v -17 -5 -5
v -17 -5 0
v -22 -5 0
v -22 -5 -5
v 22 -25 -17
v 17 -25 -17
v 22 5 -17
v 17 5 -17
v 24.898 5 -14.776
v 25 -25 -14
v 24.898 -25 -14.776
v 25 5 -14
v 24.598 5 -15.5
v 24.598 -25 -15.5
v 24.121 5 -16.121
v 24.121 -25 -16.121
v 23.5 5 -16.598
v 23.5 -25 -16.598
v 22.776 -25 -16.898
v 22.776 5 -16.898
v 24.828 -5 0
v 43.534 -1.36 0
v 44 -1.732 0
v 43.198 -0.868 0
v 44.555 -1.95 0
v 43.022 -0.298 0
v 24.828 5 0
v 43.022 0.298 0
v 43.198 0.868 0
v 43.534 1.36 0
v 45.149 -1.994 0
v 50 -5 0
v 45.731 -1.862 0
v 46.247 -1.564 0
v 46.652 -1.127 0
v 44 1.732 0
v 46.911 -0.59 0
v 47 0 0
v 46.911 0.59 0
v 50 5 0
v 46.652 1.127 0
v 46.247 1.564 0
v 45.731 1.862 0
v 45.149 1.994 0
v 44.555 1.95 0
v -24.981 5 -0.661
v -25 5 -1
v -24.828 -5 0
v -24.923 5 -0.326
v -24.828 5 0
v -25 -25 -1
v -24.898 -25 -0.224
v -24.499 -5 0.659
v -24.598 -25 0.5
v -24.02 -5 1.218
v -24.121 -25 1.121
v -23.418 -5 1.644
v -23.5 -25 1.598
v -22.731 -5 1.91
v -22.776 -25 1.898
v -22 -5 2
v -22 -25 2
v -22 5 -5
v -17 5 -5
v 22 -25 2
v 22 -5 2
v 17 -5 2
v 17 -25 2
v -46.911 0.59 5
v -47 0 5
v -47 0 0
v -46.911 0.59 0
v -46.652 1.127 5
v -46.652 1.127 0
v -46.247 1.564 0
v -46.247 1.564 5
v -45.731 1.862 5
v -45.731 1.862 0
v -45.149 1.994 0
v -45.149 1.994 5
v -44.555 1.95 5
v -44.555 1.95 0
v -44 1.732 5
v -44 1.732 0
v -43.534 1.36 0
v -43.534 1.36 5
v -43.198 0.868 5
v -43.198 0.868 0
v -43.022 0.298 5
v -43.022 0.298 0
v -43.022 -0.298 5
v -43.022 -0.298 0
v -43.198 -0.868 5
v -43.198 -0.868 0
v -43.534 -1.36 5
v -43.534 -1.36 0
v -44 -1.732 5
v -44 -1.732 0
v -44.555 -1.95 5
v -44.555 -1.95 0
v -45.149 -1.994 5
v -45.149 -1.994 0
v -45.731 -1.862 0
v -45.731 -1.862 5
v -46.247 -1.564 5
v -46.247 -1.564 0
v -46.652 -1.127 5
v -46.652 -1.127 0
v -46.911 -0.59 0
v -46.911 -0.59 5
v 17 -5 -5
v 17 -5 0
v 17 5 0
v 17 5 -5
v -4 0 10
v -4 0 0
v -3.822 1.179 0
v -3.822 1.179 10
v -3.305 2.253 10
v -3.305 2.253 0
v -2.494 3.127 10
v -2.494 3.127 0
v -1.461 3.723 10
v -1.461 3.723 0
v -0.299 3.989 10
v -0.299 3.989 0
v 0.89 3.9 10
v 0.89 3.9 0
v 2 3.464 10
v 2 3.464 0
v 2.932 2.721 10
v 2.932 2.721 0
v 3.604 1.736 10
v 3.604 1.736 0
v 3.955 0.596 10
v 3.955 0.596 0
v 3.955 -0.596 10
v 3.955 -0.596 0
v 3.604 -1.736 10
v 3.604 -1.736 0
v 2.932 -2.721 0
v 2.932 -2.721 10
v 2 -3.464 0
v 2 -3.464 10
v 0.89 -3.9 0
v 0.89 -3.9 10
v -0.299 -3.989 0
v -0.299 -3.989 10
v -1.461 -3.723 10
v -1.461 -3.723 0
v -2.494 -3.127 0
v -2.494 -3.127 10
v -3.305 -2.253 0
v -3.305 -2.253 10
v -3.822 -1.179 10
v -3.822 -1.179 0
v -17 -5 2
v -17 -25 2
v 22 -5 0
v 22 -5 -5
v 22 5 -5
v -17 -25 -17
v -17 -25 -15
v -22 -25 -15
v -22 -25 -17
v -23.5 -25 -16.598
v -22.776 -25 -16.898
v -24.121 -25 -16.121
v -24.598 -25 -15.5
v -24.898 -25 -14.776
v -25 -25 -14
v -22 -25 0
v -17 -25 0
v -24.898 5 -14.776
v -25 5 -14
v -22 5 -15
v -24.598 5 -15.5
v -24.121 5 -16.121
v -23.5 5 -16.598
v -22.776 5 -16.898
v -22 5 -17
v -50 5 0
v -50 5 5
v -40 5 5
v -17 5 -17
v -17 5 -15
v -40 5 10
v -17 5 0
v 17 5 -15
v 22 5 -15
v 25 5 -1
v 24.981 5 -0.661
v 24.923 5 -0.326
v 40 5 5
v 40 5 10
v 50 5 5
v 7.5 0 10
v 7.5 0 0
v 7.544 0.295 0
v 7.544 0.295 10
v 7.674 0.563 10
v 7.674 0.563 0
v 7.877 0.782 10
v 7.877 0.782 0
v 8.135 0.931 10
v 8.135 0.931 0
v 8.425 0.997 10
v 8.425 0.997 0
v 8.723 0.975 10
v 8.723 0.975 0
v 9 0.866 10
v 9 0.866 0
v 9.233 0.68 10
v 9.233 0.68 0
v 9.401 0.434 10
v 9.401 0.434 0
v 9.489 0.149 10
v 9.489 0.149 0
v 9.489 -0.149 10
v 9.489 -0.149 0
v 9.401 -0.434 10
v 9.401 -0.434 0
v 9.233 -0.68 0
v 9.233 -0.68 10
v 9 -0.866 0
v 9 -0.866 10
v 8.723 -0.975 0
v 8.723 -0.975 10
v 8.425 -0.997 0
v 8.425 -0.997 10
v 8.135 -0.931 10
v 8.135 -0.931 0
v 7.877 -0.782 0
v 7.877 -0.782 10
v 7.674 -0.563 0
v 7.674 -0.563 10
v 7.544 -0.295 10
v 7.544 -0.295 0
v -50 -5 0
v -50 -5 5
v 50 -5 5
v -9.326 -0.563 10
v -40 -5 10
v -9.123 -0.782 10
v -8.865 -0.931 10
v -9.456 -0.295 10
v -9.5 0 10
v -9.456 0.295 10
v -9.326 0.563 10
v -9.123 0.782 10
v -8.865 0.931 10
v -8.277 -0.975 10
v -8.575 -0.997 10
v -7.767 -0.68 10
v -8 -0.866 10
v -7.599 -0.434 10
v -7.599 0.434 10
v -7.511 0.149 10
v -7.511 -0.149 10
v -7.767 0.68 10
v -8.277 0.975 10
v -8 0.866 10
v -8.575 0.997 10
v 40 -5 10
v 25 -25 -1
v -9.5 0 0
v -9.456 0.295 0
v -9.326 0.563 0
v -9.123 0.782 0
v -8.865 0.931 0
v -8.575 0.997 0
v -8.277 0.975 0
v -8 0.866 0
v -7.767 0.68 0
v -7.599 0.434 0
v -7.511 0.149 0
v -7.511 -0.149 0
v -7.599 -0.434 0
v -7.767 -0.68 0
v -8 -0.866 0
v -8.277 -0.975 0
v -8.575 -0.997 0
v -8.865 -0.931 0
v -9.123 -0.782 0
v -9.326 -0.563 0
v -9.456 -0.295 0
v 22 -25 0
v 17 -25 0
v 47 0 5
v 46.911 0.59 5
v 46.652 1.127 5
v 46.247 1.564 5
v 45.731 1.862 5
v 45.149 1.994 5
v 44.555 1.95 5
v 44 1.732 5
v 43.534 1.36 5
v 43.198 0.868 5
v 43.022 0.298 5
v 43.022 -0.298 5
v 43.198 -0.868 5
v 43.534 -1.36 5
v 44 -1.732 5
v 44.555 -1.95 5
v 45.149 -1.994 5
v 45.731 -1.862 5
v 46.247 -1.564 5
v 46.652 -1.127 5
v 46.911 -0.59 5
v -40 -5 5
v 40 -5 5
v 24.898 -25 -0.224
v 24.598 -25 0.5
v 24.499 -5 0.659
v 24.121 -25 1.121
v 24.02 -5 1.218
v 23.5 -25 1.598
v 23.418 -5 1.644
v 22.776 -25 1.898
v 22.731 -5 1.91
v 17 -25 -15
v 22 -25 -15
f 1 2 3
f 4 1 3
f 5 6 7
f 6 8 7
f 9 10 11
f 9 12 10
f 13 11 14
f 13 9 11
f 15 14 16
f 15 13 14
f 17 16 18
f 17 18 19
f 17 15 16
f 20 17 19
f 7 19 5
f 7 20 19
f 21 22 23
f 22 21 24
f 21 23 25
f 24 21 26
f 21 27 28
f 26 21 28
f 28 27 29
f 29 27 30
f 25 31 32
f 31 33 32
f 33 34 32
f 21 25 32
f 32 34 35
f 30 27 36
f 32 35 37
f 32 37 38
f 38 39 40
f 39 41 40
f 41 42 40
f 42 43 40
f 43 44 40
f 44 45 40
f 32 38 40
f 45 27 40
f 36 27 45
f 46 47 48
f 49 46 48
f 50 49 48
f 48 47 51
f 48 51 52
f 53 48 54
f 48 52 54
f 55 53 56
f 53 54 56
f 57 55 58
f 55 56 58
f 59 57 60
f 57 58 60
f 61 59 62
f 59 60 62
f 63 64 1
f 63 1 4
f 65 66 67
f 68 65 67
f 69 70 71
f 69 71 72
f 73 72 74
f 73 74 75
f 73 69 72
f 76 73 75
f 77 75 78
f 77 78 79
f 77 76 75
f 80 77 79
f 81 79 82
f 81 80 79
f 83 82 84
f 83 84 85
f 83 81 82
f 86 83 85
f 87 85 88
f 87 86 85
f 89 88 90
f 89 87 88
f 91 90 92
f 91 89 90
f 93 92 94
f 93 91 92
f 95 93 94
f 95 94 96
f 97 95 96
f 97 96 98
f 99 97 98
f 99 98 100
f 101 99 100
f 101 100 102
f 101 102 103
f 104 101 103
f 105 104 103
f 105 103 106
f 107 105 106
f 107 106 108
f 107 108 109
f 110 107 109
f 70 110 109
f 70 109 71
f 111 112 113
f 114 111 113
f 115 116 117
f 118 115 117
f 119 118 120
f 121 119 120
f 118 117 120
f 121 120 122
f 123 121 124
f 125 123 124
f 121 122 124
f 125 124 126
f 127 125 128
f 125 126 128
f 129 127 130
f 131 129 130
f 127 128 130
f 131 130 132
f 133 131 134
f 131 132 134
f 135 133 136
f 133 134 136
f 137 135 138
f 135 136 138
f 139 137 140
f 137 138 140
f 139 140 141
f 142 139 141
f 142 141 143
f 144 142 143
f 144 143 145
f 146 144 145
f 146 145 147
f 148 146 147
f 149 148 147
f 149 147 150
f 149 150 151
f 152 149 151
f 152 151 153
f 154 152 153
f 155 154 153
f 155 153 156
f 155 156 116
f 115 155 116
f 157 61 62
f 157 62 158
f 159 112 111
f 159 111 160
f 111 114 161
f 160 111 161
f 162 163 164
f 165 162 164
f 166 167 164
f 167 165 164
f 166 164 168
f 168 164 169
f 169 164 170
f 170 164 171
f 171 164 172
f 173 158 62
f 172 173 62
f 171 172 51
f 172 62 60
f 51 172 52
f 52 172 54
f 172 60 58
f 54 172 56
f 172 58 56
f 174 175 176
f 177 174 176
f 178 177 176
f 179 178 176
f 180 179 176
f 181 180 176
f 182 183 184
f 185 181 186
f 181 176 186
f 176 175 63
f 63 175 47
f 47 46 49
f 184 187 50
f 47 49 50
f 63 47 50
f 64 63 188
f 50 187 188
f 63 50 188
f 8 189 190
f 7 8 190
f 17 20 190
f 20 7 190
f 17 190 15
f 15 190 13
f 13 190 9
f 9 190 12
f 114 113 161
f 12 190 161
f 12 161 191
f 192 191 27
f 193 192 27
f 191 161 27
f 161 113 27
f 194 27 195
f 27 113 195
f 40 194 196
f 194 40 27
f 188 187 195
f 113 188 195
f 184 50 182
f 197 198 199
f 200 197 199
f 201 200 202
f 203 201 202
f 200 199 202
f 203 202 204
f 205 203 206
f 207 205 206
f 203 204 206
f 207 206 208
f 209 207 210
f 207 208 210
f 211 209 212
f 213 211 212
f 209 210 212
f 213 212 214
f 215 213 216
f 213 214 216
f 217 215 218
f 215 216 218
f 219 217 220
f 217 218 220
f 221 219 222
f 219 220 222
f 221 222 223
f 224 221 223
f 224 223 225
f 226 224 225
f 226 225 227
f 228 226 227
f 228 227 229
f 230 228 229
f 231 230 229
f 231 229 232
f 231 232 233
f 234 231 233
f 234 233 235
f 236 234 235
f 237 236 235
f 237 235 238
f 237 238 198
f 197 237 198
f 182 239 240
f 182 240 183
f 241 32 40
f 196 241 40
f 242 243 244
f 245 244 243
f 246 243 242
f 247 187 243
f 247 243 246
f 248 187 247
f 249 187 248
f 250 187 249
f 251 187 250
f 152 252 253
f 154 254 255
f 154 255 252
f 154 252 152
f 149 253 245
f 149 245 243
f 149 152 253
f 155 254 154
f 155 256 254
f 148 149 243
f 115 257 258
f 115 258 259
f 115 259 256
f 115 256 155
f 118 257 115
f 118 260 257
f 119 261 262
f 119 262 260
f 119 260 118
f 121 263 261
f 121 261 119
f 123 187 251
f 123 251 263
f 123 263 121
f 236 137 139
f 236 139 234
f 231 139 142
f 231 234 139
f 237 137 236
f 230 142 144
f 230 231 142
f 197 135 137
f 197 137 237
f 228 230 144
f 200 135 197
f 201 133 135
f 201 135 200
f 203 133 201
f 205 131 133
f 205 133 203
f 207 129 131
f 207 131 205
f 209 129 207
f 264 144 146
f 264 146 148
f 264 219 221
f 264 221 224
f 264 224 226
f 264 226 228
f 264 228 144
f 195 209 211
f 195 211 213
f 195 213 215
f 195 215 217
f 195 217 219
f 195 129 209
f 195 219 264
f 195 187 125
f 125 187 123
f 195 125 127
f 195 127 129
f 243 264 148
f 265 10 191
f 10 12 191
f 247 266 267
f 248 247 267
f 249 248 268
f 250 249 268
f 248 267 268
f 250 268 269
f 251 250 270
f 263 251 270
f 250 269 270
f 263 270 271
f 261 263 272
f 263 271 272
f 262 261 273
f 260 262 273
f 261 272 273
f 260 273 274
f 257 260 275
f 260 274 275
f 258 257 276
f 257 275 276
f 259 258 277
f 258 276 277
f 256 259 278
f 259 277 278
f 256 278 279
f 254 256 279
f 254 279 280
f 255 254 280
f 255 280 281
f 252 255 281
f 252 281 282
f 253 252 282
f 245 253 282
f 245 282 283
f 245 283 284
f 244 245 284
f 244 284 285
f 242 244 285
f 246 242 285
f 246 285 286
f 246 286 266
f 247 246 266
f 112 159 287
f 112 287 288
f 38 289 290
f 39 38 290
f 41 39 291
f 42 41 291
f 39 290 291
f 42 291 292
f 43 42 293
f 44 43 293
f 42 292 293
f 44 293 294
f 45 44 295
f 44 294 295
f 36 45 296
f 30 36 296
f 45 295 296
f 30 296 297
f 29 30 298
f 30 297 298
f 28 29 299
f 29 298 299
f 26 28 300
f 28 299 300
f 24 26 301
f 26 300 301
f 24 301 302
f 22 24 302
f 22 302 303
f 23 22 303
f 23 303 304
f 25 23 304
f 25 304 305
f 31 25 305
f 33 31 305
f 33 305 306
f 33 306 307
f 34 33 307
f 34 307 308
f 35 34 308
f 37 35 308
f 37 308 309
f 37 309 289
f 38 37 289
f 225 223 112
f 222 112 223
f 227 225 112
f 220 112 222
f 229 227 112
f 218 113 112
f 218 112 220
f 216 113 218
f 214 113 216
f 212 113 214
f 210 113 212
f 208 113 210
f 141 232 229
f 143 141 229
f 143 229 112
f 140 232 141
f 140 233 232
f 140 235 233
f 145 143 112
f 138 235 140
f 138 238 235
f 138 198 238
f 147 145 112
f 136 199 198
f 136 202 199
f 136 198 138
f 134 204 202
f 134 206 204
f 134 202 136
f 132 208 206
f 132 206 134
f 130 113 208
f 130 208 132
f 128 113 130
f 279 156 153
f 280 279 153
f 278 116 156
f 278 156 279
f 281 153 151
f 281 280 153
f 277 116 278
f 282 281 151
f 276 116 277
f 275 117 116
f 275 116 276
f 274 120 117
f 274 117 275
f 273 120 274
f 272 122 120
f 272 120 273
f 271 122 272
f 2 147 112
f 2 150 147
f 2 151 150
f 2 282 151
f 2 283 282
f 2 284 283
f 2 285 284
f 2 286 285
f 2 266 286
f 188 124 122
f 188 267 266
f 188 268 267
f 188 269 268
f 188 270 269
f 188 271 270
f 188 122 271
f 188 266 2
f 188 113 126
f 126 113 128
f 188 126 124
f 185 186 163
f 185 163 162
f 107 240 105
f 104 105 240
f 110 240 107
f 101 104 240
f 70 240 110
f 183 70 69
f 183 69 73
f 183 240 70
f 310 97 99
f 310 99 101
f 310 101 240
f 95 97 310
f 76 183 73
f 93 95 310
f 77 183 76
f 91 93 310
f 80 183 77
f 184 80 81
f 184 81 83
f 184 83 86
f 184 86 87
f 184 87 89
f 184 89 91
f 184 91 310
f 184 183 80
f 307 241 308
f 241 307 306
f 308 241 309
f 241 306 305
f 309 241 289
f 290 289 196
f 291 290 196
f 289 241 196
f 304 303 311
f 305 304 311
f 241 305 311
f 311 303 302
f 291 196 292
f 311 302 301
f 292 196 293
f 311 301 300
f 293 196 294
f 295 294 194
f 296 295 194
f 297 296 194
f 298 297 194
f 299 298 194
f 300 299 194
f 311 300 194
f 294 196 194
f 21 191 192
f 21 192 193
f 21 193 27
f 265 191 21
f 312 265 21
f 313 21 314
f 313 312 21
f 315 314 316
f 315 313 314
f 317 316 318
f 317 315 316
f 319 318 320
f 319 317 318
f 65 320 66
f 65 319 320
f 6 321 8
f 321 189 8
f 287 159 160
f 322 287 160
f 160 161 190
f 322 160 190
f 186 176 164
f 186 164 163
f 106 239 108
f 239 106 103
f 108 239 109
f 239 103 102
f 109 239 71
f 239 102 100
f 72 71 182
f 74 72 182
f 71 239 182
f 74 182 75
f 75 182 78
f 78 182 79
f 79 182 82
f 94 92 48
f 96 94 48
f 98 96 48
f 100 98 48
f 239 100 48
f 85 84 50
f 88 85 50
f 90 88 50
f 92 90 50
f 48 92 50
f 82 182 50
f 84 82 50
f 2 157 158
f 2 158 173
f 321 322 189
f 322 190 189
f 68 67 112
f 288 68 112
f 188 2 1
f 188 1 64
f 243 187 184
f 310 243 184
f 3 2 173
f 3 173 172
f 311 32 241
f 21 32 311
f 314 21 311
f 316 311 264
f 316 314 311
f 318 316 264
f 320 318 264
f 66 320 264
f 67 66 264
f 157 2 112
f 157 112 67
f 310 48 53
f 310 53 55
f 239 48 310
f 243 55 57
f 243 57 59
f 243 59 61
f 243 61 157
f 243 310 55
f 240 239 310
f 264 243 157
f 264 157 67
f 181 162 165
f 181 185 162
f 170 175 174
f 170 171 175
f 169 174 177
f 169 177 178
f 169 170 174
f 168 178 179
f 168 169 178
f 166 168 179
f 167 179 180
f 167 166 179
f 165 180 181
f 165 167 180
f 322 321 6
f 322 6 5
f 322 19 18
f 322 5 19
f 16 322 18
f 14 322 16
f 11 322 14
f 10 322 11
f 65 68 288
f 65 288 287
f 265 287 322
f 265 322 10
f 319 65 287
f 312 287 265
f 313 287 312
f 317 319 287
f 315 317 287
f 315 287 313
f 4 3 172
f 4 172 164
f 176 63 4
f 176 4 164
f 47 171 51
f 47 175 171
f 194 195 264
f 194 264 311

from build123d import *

# Parameters (mm, degrees)
SKETCH1_W           = 100
SKETCH1_H           = 10
BOSS_EXTRUDE1_DEPTH = 10
SKETCH6_W           = 3
SKETCH6_H           = 10
BOSS_EXTRUDE2_DEPTH = 17
SKETCH8_W           = 2
SKETCH8_H           = 10
BOSS_EXTRUDE3_DEPTH = 5
BOSS_EXTRUDE4_DEPTH = 20
SKETCH2_W           = 10
SKETCH2_H           = 5
CUT_EXTRUDE1_DEPTH  = 10
CUT_EXTRUDE2_REACH  = 62.075
SKETCH10_R          = 2
SKETCH13_R          = 4
SKETCH13_R_2        = 1
CUT_EXTRUDE3_DEPTH  = 59.429444632
FILLET1_R           = 3
FILLET2_R           = 3
SKETCH14_W          = 5
SKETCH14_H          = 10
BOSS_EXTRUDE5_DEPTH = 5


with BuildPart() as part:
    # Sketch1 → Boss-Extrude1 (new body)
    with BuildSketch(Plane.XY):
        Rectangle(SKETCH1_W, SKETCH1_H)
    extrude(amount=BOSS_EXTRUDE1_DEPTH)

    # Sketch6 → Boss-Extrude2 (add)
    with BuildSketch(Plane(origin=(0, 0, 0), x_dir=(-1, 0, 0), z_dir=(0, 0, -1))):
        with Locations((-23.5, 0)):
            Rectangle(SKETCH6_W, SKETCH6_H)
    boss_extrude2 = extrude(amount=BOSS_EXTRUDE2_DEPTH)

    # Sketch8 → Boss-Extrude3 (add)
    with BuildSketch(Plane.ZY.offset(-22)):
        with Locations((-16, 0)):
            Rectangle(SKETCH8_W, SKETCH8_H)
    boss_extrude3 = extrude(amount=BOSS_EXTRUDE3_DEPTH)

    # Sketch9 → Boss-Extrude4 (add)
    with BuildSketch(Plane.XZ.offset(5)):
        Polygon((17, 2), (17, 0), (22, 0), (22, -15), (17, -15), (17, -17), (25, -17), (25, 0), (25, 2), align=None)
    boss_extrude4 = extrude(amount=BOSS_EXTRUDE4_DEPTH)

    # Mirror3: Boss-Extrude2, Boss-Extrude3, Boss-Extrude4 across plane
    add(boss_extrude2.mirror(Plane(origin=(0, 0, 0), x_dir=(0, 0, 1), z_dir=(1, 0, 0))))
    add(boss_extrude3.mirror(Plane(origin=(0, 0, 0), x_dir=(0, 0, 1), z_dir=(1, 0, 0))))
    add(boss_extrude4.mirror(Plane(origin=(0, 0, 0), x_dir=(0, 0, 1), z_dir=(1, 0, 0))))

    # Sketch2 → Cut-Extrude1 (cut)
    with BuildSketch(Plane(origin=(0, 5, 0), x_dir=(1, 0, 0), z_dir=(0, 1, 0))):
        with Locations((-45, -7.5)):
            Rectangle(SKETCH2_W, SKETCH2_H)
    cut_extrude1 = extrude(amount=-CUT_EXTRUDE1_DEPTH, mode=Mode.SUBTRACT)

    # Mirror4: Cut-Extrude1 across plane
    add(cut_extrude1.mirror(Plane(origin=(0, 0, 0), x_dir=(0, 0, 1), z_dir=(1, 0, 0))), mode=Mode.SUBTRACT)

    # Sketch10 → Cut-Extrude2 (cut, up to next)
    with BuildSketch(Plane.XY.offset(5), mode=Mode.PRIVATE) as cut_extrude2_sk1:
        with Locations((45, 0)):
            Circle(SKETCH10_R)
    cut_extrude2_tool1 = extrude(cut_extrude2_sk1.sketch, amount=-CUT_EXTRUDE2_REACH, mode=Mode.PRIVATE) & part.part
    cut_extrude2 = cut_extrude2_tool1.solids().sort_by_distance((45, 0, 5))[0]
    add(cut_extrude2, mode=Mode.SUBTRACT)

    # Mirror5: Cut-Extrude2 across plane
    add(cut_extrude2.mirror(Plane(origin=(0, 0, 0), x_dir=(0, 0, 1), z_dir=(1, 0, 0))), mode=Mode.SUBTRACT)

    # Sketch13 → Cut-Extrude3 (cut, through all)
    with BuildSketch(Plane(origin=(0, 0, 0), x_dir=(-1, 0, 0), z_dir=(0, 0, -1))):
        Circle(SKETCH13_R)
        with Locations((-8.5, 0)):
            Circle(SKETCH13_R_2)
        with Locations((8.5, 0)):
            Circle(SKETCH13_R_2)
    extrude(amount=-CUT_EXTRUDE3_DEPTH, mode=Mode.SUBTRACT)

    # Fillet1
    fillet1_edges = [part.edges().sort_by_distance(p)[0] for p in [
        (25, -10, -17),
        (-25, -10, -17),
    ]]
    fillet(fillet1_edges, radius=FILLET1_R)

    # Fillet2
    fillet2_edges = [part.edges().sort_by_distance(p)[0] for p in [
        (-25, -15, 2),
        (25, -15, 2),
    ]]
    fillet(fillet2_edges, radius=FILLET2_R)

    # Sketch14 → Boss-Extrude5 (add)
    with BuildSketch(Plane(origin=(0, 0, 0), x_dir=(-1, 0, 0), z_dir=(0, 0, -1))):
        with Locations((19.5, 0)):
            Rectangle(SKETCH14_W, SKETCH14_H)
    boss_extrude5 = extrude(amount=BOSS_EXTRUDE5_DEPTH)

    # Mirror6: Boss-Extrude5 across plane
    add(boss_extrude5.mirror(Plane(origin=(0, 0, 0), x_dir=(0, 0, 1), z_dir=(1, 0, 0))))


solid = part.part
